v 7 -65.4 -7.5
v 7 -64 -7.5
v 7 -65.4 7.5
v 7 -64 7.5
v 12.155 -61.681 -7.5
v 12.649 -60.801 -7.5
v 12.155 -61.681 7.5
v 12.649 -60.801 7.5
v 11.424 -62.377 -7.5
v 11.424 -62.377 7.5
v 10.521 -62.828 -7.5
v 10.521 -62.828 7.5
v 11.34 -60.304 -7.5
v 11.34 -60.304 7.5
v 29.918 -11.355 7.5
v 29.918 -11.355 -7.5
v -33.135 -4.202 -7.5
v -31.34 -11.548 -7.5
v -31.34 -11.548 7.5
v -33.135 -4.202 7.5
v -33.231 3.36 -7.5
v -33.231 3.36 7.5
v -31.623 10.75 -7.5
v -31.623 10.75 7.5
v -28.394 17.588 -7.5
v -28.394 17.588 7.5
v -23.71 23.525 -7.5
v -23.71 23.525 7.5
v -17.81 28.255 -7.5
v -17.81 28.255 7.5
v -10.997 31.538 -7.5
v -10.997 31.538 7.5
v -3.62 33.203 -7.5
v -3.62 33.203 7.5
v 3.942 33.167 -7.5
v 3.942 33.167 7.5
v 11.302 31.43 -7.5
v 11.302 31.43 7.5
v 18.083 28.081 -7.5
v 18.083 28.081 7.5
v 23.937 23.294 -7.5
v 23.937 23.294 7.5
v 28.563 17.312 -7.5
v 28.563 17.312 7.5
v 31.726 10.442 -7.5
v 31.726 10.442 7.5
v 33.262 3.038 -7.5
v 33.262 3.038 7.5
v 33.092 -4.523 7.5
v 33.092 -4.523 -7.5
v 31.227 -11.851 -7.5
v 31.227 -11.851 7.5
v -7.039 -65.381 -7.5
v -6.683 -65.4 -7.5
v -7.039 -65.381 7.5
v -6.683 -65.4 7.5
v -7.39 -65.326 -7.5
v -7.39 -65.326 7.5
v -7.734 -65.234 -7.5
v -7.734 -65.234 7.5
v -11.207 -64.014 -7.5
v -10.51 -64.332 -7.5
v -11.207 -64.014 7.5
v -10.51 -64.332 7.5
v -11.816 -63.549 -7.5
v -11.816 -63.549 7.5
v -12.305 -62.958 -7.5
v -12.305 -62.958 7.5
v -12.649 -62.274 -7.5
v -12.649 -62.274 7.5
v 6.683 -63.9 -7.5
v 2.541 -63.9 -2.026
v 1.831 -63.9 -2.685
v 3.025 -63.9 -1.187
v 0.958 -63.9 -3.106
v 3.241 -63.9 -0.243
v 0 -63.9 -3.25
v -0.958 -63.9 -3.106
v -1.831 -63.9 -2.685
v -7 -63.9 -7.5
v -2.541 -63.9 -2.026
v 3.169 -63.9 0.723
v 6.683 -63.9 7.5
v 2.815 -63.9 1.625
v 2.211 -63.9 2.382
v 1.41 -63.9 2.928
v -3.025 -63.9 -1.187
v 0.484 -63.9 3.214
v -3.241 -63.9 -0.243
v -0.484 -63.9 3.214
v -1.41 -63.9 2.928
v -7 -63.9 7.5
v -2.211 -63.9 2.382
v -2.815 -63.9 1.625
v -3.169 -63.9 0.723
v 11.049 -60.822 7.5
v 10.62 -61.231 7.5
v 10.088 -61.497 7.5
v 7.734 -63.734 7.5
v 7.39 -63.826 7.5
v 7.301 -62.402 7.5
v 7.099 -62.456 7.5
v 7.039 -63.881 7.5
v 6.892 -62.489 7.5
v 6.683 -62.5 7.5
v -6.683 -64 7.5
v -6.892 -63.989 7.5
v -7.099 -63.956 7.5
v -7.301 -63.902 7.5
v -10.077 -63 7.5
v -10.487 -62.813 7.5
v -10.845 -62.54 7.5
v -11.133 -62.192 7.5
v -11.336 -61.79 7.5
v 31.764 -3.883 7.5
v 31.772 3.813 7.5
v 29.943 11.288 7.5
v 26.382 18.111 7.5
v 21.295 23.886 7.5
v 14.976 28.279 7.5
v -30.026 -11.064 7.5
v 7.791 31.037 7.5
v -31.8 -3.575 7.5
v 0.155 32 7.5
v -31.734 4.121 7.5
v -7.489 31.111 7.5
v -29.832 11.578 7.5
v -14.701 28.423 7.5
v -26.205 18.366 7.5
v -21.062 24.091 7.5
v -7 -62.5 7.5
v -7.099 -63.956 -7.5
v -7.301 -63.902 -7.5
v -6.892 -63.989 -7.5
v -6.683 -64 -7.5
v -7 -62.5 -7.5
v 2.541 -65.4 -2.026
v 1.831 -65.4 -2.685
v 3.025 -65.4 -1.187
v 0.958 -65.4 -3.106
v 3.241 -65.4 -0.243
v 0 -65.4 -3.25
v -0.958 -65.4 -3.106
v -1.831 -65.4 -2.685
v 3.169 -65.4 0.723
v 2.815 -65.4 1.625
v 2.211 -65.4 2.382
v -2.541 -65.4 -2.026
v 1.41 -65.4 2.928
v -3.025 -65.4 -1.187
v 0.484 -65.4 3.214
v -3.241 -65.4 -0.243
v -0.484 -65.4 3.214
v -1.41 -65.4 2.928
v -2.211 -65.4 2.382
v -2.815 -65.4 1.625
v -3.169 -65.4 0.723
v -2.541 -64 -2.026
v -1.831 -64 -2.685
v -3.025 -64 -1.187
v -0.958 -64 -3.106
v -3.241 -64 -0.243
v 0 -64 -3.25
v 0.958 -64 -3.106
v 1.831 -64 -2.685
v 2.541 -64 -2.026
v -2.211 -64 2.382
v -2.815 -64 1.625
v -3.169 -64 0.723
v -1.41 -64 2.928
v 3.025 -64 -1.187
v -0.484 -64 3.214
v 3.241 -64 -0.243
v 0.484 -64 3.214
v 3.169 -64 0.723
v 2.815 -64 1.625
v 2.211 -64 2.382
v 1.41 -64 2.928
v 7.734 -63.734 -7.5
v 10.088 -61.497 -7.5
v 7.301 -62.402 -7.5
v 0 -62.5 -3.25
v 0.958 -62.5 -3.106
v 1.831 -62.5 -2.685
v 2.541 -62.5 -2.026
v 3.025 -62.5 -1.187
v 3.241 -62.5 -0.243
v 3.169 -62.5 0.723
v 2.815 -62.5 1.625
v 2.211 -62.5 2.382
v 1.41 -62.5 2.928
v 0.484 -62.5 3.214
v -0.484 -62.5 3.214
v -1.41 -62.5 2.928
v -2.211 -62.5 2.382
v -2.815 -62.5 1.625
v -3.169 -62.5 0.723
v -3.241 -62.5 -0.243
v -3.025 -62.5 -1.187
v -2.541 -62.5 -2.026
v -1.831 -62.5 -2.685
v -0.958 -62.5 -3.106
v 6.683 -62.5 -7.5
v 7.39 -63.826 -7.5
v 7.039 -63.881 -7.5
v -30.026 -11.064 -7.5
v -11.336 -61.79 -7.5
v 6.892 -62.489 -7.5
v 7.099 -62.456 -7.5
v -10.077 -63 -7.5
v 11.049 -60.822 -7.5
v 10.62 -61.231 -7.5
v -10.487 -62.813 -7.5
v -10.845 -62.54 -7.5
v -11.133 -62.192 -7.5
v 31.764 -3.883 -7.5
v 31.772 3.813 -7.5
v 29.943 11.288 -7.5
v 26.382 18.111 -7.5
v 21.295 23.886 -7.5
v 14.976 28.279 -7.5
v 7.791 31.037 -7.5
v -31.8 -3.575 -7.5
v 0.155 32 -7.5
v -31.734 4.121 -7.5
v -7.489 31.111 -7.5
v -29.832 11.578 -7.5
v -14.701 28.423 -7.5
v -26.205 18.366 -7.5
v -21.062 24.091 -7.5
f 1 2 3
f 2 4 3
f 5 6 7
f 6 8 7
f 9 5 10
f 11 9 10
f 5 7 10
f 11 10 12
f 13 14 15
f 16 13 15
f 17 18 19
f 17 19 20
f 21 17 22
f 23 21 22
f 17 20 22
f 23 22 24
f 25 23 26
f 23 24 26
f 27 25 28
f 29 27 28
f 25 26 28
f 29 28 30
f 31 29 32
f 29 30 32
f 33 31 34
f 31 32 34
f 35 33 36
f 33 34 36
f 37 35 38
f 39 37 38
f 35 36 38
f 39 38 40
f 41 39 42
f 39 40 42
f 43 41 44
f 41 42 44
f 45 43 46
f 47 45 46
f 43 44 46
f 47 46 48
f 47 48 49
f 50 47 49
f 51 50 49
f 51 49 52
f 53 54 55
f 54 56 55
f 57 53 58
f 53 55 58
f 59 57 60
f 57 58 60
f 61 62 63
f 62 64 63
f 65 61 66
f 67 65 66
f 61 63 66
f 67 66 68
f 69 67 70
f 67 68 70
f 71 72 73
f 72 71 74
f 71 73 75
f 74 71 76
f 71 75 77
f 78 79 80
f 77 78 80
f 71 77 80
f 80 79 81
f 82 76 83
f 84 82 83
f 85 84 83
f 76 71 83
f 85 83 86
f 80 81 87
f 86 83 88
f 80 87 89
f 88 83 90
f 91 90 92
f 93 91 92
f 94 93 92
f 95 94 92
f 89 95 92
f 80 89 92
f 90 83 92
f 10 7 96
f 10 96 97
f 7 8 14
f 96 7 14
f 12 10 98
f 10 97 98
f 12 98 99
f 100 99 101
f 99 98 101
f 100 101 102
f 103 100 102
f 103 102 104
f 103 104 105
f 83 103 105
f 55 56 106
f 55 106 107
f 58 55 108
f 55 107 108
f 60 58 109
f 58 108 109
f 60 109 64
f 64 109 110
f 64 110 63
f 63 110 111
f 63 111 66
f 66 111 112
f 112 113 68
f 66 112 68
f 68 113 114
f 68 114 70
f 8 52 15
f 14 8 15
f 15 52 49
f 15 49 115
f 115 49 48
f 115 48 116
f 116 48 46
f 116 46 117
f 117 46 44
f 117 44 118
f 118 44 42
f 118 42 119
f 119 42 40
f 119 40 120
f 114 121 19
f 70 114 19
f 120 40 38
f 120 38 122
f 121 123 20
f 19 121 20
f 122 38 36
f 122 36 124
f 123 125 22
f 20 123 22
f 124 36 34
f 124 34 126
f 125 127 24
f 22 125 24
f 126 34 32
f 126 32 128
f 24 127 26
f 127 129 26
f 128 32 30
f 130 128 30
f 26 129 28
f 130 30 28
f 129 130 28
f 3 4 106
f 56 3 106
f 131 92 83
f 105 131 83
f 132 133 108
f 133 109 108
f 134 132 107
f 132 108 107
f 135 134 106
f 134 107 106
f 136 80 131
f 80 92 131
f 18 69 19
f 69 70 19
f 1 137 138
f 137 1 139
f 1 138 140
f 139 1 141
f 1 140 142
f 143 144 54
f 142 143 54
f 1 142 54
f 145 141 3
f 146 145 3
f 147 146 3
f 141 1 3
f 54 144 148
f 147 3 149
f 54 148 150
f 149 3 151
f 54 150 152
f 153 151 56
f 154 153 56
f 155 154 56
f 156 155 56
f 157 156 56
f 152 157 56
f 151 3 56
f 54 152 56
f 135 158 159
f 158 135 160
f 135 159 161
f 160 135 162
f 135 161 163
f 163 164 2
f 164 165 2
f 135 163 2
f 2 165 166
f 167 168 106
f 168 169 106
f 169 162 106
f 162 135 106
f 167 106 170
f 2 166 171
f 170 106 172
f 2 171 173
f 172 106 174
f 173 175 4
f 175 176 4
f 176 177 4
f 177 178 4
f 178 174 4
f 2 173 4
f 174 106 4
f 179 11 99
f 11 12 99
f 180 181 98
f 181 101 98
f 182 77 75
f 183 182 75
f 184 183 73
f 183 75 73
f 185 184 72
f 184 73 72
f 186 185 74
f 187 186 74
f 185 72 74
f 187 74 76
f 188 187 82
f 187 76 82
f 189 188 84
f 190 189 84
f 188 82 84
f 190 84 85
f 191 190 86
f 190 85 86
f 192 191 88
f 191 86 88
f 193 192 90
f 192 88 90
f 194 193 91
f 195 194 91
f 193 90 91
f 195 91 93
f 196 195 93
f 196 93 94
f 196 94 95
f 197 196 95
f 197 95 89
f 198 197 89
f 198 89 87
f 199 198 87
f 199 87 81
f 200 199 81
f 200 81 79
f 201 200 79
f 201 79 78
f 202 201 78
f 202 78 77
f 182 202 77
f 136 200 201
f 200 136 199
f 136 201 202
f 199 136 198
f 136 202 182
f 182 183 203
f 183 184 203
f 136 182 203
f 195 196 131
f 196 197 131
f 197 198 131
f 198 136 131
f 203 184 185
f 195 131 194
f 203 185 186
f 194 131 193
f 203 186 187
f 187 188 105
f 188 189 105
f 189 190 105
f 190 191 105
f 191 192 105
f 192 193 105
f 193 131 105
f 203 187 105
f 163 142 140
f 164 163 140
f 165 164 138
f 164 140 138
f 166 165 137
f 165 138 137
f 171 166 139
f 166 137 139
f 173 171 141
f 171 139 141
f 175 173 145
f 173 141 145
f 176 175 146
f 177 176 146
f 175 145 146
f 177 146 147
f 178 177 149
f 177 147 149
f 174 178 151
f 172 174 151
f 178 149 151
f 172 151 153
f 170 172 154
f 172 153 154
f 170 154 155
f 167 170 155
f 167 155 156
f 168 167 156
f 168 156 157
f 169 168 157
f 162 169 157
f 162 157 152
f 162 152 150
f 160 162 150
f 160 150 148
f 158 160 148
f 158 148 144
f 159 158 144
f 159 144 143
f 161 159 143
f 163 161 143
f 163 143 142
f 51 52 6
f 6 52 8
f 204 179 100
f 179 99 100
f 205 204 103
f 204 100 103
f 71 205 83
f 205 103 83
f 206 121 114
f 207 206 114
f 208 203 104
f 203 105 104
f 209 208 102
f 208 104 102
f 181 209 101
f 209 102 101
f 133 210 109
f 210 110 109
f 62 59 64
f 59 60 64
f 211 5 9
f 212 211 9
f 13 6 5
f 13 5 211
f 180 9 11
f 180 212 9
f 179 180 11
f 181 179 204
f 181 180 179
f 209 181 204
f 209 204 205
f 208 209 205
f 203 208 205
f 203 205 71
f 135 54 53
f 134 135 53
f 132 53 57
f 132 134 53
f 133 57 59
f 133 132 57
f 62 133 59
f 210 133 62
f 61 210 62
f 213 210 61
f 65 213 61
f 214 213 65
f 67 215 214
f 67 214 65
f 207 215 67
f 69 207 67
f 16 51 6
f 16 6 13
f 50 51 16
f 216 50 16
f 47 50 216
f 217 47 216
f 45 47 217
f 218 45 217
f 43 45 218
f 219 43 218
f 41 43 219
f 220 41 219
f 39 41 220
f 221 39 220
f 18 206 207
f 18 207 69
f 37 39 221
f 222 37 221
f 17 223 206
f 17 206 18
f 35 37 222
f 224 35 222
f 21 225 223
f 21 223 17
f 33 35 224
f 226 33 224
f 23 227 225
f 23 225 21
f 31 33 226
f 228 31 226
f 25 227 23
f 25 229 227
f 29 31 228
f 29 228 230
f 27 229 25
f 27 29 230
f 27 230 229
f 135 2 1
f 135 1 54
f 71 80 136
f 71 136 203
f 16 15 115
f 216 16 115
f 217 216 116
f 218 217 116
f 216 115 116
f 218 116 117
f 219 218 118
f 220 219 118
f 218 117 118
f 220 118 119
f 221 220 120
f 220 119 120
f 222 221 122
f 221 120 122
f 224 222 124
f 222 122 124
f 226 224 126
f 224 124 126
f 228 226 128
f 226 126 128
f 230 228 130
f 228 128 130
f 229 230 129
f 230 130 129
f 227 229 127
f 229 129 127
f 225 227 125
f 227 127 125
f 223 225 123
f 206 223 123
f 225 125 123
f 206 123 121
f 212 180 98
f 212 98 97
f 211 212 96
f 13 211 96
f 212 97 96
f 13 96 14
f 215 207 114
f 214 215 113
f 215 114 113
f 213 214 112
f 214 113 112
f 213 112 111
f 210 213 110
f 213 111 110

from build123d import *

# Parameters (mm, degrees)
EXTRUSION4_DEPTH        = 7.5
ESQUISSE2_R             = 3.25
ENL_V_MAT_EXTRU_1_DEPTH = 15


with BuildPart() as part:
    # Esquisse1 → Extrusion4 (new, symmetric)
    with BuildSketch(Plane.XY):
        with BuildLine():
            Line((-30.026499529, -11.063874821), (-11.335566656, -61.789619296))
            ThreePointArc((-11.335566656, -61.789619296), (-10.845370144, -62.539560252), (-10.076944424, -63.000240152))
            Line((-10.076944424, -63.000240152), (-7.301265108, -63.902113033))
            ThreePointArc((-7.301265108, -63.902113033), (-6.996100049, -63.975376681), (-6.683231119, -64))
            Line((-6.683231119, -64), (7, -64))
            Line((7, -64), (7, -65.4))
            Line((7, -65.4), (-6.683231119, -65.4))
            ThreePointArc((-6.683231119, -65.4), (-7.2151083, -65.358140358), (-7.7338889, -65.233592155))
            Line((-7.7338889, -65.233592155), (-10.509568216, -64.331719275))
            ThreePointArc((-10.509568216, -64.331719275), (-11.81589194, -63.548563445), (-12.64922601, -62.27366382))
            Line((-12.64922601, -62.27366382), (-31.340158883, -11.547919345))
            ThreePointArc((-31.340158883, -11.547919345), (0.161979155, 33.399607225), (31.226678681, -11.851351759))
            Line((31.226678681, -11.851351759), (12.649044499, -60.800857693))
            ThreePointArc((12.649044499, -60.800857693), (11.815350768, -62.056270768), (10.520938582, -62.828024819))
            Line((10.520938582, -62.828024819), (7.7338889, -63.733592155))
            ThreePointArc((7.7338889, -63.733592155), (7.2151083, -63.858140358), (6.683231119, -63.9))
            Line((6.683231119, -63.9), (-7, -63.9))
            Line((-7, -63.9), (-7, -62.5))
            Line((-7, -62.5), (6.683231119, -62.5))
            ThreePointArc((6.683231119, -62.5), (6.996100049, -62.475376681), (7.301265108, -62.402113033))
            Line((7.301265108, -62.402113033), (10.08831479, -61.496545697))
            ThreePointArc((10.08831479, -61.496545697), (10.849733723, -61.042572725), (11.3401418, -60.304094446))
            Line((11.3401418, -60.304094446), (29.917775982, -11.354588512))
            ThreePointArc((29.917775982, -11.354588512), (0.155189609, 31.999623688), (-30.026499529, -11.063874821))
        make_face()
    extrude(amount=EXTRUSION4_DEPTH, both=True)

    # Esquisse2 → Enlèv. mat.-Extru.1 (cut)
    with BuildSketch(Plane.XZ.offset(65.4)):
        Circle(ESQUISSE2_R)
    extrude(amount=-ENL_V_MAT_EXTRU_1_DEPTH, mode=Mode.SUBTRACT)


solid = part.part
